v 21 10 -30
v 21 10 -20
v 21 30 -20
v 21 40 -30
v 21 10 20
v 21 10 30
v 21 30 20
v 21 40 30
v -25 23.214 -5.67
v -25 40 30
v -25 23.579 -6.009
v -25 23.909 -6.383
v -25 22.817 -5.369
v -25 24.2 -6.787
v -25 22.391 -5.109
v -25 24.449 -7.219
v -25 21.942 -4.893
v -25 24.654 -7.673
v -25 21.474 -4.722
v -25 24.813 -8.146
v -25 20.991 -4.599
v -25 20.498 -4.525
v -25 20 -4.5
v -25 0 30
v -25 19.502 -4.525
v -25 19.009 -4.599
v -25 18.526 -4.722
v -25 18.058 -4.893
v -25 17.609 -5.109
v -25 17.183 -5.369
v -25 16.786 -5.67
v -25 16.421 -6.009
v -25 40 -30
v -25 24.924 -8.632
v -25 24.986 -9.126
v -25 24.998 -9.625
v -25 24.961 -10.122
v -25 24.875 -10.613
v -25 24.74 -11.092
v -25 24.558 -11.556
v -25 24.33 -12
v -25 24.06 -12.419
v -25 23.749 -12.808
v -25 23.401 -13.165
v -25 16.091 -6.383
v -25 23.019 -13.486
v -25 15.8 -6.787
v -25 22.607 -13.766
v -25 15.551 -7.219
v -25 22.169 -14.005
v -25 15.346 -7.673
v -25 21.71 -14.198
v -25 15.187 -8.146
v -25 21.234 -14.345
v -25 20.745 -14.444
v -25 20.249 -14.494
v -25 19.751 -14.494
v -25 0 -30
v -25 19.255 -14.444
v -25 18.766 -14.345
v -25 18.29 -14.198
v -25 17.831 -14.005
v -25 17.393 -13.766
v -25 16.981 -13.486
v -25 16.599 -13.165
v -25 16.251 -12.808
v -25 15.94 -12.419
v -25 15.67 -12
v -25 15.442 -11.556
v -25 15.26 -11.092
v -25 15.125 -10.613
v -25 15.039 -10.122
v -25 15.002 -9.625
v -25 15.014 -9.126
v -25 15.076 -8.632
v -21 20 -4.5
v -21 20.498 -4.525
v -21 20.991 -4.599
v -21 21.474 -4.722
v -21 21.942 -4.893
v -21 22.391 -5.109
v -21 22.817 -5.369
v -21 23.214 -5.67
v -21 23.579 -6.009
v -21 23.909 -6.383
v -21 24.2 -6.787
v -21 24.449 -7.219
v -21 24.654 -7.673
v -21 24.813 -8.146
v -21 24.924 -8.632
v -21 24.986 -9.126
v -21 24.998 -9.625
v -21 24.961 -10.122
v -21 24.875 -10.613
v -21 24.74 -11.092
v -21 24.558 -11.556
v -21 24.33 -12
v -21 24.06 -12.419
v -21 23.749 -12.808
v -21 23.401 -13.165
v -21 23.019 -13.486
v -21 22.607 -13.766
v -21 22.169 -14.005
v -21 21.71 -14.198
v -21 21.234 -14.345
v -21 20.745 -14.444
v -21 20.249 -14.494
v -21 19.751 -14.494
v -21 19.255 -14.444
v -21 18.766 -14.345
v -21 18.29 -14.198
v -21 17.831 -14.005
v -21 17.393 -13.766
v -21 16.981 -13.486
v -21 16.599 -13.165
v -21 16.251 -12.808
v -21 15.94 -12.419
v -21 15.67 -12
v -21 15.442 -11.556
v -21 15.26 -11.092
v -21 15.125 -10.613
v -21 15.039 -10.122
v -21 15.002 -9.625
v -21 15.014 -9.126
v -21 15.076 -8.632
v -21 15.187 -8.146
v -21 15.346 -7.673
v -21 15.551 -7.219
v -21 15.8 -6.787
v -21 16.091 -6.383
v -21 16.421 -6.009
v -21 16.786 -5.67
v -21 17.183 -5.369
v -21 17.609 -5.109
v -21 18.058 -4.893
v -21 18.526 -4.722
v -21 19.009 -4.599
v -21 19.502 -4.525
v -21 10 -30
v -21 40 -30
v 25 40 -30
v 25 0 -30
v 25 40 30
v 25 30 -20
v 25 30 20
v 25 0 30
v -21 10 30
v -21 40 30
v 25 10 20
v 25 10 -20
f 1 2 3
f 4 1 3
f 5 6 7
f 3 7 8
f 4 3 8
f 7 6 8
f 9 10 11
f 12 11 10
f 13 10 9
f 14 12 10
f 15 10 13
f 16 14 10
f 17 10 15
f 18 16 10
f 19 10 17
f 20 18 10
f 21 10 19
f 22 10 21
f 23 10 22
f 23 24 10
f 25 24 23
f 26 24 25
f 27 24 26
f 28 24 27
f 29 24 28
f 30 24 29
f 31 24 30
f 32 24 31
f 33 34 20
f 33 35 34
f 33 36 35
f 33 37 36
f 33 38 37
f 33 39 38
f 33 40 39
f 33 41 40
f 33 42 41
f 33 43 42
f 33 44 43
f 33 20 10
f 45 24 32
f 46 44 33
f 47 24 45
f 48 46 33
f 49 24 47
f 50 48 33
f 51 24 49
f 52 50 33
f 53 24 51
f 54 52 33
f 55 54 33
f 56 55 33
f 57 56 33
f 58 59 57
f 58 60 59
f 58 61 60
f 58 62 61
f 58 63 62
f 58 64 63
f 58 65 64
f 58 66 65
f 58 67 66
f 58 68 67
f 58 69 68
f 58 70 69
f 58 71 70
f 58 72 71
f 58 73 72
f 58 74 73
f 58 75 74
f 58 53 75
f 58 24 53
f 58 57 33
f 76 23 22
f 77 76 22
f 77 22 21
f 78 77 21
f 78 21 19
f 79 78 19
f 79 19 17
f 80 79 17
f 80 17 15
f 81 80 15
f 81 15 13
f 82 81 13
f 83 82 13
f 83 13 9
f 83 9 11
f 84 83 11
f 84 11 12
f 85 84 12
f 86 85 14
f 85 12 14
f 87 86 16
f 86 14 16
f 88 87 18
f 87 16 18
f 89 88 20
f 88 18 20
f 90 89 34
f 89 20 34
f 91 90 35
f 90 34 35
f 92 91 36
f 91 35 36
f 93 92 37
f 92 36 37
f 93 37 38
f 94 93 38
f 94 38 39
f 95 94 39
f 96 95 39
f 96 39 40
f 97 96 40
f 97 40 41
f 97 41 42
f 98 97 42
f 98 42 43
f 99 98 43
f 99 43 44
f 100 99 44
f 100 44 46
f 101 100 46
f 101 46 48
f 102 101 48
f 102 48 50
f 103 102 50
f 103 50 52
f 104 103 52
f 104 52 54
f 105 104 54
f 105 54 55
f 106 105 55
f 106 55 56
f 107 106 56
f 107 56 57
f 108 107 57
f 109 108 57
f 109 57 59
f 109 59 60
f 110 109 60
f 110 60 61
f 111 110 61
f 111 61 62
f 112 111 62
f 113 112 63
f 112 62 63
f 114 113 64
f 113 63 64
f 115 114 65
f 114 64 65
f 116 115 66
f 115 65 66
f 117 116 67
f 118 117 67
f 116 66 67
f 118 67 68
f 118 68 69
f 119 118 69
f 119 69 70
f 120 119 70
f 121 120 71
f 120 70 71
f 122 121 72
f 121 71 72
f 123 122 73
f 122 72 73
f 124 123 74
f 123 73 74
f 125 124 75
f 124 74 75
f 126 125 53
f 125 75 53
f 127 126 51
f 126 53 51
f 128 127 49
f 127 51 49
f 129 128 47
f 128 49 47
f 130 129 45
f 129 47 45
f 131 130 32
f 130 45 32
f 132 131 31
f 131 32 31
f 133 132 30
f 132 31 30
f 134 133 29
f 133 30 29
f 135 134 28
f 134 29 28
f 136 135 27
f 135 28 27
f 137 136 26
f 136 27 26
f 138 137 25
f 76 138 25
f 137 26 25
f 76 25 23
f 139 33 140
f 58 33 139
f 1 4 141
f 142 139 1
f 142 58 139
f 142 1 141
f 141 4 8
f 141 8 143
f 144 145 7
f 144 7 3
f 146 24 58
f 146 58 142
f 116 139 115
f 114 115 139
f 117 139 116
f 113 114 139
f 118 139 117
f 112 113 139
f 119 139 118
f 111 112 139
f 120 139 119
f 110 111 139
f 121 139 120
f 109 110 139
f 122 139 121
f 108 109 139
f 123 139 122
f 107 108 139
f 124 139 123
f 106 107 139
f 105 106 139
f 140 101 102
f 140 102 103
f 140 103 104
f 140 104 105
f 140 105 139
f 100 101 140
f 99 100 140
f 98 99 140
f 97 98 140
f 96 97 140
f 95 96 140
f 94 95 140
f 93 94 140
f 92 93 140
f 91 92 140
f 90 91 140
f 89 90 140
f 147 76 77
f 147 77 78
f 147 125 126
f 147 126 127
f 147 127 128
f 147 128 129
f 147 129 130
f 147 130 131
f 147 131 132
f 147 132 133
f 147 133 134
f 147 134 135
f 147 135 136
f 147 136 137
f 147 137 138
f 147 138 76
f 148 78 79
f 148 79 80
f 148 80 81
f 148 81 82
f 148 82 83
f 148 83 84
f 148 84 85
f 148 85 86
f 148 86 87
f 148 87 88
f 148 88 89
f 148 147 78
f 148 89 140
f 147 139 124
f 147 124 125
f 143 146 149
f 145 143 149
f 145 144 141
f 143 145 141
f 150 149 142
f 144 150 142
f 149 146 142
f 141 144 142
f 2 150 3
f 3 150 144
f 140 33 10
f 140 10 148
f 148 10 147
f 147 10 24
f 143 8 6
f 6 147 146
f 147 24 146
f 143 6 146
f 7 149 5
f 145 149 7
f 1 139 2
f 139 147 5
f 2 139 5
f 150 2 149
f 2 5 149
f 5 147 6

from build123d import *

# Parameters (mm, degrees)
SKETCH4_W           = 50
SKETCH4_H           = 60
BOSS_EXTRUDE6_DEPTH = 40
SKETCH9_W           = 42
SKETCH9_H           = 56.420845642
CUT_EXTRUDE3_DEPTH  = 60
SKETCH10_W          = 40
SKETCH10_H          = 20
CUT_EXTRUDE4_DEPTH  = 20
SKETCH11_R          = 5
CUT_EXTRUDE5_DEPTH  = 10


with BuildPart() as part:
    # Sketch4 → Boss-Extrude6 (new body)
    with BuildSketch(Plane(origin=(0, 0, 0), x_dir=(1, 0, 0), z_dir=(0, 1, 0))):
        Rectangle(SKETCH4_W, SKETCH4_H)
    extrude(amount=BOSS_EXTRUDE6_DEPTH)

    # Sketch9 → Cut-Extrude3 (cut)
    with BuildSketch(Plane.XY.offset(30)):
        with Locations((0, 38.210422821)):
            Rectangle(SKETCH9_W, SKETCH9_H)
    extrude(amount=-CUT_EXTRUDE3_DEPTH, mode=Mode.SUBTRACT)

    # Sketch10 → Cut-Extrude4 (cut)
    with BuildSketch(Plane(origin=(25, 0, 0), x_dir=(0, 0, -1), z_dir=(1, 0, 0))):
        with Locations((0, 20)):
            Rectangle(SKETCH10_W, SKETCH10_H)
    extrude(amount=-CUT_EXTRUDE4_DEPTH, mode=Mode.SUBTRACT)

    # Sketch11 → Cut-Extrude5 (cut)
    with BuildSketch(Plane.ZY.offset(25)):
        with Locations((-9.5, 20)):
            Circle(SKETCH11_R)
    extrude(amount=-CUT_EXTRUDE5_DEPTH, mode=Mode.SUBTRACT)


solid = part.part
